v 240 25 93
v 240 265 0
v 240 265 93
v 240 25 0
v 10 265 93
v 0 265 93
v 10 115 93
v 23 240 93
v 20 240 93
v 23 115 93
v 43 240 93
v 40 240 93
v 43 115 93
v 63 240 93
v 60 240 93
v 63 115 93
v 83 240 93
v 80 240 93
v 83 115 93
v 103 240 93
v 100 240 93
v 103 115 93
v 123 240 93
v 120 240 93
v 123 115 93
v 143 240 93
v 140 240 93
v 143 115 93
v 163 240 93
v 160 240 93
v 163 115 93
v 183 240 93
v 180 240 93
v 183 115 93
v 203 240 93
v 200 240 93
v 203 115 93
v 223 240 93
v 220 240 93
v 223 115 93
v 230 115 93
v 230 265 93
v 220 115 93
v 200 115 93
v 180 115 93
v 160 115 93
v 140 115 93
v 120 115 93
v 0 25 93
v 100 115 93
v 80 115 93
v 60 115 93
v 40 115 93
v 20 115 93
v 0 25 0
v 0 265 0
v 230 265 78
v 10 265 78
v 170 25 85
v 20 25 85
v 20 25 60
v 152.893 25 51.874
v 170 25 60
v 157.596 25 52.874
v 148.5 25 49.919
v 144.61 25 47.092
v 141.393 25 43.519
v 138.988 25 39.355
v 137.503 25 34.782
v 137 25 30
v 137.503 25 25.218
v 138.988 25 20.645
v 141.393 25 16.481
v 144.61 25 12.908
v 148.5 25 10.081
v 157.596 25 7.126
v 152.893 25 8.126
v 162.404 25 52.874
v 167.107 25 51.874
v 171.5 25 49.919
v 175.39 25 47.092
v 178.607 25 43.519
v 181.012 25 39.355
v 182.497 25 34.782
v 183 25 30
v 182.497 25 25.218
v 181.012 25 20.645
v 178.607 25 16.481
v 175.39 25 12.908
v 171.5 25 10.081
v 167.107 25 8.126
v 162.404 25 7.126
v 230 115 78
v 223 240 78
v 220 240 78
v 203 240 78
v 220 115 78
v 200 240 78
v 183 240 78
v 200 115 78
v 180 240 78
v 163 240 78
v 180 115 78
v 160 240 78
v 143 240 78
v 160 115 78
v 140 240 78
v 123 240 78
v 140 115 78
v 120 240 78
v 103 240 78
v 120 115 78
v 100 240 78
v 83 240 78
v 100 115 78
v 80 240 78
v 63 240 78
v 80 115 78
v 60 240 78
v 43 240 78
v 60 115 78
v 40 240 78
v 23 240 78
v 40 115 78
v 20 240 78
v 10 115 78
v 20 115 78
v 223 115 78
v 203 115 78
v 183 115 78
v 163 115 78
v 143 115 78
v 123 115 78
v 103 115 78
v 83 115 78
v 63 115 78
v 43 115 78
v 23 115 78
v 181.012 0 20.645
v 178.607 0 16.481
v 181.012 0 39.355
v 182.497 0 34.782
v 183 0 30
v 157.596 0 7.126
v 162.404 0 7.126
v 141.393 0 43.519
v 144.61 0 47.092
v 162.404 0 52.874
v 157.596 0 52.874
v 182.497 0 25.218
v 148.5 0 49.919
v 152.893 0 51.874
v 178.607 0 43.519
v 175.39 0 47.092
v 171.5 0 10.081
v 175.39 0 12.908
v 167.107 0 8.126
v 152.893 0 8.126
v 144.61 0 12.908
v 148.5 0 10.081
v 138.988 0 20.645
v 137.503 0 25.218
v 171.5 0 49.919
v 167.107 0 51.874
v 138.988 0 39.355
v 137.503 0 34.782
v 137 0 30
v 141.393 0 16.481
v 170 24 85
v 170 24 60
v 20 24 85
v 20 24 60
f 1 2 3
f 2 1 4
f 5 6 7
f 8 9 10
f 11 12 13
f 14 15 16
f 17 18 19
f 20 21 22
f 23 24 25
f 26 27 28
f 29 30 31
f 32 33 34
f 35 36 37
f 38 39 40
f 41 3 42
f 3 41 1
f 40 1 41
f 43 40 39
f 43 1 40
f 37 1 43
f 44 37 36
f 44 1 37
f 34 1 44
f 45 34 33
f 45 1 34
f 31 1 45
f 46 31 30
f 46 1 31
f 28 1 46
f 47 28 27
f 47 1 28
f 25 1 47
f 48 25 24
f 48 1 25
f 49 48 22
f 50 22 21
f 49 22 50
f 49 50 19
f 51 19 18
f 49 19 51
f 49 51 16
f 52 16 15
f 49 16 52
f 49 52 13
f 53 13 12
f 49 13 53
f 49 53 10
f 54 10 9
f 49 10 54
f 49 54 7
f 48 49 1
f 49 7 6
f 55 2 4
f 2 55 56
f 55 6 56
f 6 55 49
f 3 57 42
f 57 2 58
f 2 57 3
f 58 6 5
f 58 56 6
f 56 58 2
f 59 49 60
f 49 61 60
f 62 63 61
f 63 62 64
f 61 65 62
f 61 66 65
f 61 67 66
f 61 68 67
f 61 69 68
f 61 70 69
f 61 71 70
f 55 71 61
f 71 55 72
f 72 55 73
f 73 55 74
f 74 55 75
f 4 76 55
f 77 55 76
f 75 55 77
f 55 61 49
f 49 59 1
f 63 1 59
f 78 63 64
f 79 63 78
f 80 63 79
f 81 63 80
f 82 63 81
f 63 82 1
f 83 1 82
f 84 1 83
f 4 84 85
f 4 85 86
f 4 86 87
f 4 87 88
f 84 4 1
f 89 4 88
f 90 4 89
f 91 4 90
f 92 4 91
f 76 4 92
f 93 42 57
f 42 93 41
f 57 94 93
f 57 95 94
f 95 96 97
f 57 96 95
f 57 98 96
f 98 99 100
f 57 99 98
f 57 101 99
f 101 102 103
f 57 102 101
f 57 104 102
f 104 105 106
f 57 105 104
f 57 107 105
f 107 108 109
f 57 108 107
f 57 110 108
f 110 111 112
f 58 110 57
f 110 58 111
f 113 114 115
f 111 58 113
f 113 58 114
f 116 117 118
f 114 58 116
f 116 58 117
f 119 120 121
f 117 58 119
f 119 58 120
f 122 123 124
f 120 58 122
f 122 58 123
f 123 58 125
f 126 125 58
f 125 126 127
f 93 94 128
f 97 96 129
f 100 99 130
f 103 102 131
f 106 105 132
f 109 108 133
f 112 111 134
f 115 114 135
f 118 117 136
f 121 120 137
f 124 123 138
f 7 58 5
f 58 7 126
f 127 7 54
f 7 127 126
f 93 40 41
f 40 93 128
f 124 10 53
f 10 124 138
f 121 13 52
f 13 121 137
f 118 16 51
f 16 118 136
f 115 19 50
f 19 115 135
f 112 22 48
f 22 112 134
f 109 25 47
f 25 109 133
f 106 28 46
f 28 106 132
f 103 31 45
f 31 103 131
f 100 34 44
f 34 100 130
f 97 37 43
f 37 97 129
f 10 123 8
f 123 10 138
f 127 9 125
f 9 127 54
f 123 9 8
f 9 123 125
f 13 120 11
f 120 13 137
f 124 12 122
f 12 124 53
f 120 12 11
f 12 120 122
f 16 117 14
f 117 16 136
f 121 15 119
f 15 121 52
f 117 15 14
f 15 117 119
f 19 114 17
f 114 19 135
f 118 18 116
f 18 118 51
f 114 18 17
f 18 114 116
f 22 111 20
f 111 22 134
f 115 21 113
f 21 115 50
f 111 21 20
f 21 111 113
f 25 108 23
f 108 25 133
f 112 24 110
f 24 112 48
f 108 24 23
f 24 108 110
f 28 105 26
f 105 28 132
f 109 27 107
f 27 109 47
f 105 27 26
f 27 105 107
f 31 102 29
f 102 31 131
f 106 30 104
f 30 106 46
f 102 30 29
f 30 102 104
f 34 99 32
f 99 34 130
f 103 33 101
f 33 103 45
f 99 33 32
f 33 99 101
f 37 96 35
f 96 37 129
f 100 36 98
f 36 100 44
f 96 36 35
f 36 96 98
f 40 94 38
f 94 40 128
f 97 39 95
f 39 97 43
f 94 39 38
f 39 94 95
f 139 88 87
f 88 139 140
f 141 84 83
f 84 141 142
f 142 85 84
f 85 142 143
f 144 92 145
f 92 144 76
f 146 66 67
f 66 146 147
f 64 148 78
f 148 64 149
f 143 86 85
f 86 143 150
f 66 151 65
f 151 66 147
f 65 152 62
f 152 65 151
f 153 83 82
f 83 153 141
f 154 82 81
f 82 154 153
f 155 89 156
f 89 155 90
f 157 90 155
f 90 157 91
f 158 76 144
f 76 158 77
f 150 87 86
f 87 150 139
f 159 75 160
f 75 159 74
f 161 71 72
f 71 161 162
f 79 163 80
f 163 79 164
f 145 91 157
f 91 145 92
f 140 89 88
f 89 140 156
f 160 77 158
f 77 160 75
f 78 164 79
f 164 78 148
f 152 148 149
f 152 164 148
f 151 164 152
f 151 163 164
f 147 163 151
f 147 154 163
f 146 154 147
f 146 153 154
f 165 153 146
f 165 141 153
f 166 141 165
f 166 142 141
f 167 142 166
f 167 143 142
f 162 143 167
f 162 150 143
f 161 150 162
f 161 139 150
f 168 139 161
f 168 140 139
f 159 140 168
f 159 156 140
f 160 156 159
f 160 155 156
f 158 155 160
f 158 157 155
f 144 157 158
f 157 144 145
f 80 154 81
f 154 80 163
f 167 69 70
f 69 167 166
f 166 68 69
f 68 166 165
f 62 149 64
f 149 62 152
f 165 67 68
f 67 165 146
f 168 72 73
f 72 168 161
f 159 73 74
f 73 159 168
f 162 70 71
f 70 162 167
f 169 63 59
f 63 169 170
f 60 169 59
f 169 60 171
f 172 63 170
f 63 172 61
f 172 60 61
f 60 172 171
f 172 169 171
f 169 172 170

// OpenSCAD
module KWTXRX() {
translate([0,25,0]) {
    difference() {
    color([0.1,0.1,0.1]) cube([240,240,93]);
    color([0.2,0.2,0.2]) translate([10,90,78]) cube([220,150,15]);
}
}
for(i = [1:11])
    color([0.4,0.4,0.4]) translate([i*20,90,78]) cube([3,150,15]);

//TODO    
translate([160,25,30]) color([0.7,0.7,0.7]) rotate([90,0,0]) cylinder(25,r=23);

translate([12,250,12]) color([0.7,0.7,0.7]) rotate([90,0,0]) cylinder(5,d=16);

translate ([20,24,60]) color([0.2,0.0,0.8]) cube([150,1,25]);
    
translate ([205,240,50]) color([0.7,0.7,0.7]) cube([15,20,15]);
}

KWTXRX();
